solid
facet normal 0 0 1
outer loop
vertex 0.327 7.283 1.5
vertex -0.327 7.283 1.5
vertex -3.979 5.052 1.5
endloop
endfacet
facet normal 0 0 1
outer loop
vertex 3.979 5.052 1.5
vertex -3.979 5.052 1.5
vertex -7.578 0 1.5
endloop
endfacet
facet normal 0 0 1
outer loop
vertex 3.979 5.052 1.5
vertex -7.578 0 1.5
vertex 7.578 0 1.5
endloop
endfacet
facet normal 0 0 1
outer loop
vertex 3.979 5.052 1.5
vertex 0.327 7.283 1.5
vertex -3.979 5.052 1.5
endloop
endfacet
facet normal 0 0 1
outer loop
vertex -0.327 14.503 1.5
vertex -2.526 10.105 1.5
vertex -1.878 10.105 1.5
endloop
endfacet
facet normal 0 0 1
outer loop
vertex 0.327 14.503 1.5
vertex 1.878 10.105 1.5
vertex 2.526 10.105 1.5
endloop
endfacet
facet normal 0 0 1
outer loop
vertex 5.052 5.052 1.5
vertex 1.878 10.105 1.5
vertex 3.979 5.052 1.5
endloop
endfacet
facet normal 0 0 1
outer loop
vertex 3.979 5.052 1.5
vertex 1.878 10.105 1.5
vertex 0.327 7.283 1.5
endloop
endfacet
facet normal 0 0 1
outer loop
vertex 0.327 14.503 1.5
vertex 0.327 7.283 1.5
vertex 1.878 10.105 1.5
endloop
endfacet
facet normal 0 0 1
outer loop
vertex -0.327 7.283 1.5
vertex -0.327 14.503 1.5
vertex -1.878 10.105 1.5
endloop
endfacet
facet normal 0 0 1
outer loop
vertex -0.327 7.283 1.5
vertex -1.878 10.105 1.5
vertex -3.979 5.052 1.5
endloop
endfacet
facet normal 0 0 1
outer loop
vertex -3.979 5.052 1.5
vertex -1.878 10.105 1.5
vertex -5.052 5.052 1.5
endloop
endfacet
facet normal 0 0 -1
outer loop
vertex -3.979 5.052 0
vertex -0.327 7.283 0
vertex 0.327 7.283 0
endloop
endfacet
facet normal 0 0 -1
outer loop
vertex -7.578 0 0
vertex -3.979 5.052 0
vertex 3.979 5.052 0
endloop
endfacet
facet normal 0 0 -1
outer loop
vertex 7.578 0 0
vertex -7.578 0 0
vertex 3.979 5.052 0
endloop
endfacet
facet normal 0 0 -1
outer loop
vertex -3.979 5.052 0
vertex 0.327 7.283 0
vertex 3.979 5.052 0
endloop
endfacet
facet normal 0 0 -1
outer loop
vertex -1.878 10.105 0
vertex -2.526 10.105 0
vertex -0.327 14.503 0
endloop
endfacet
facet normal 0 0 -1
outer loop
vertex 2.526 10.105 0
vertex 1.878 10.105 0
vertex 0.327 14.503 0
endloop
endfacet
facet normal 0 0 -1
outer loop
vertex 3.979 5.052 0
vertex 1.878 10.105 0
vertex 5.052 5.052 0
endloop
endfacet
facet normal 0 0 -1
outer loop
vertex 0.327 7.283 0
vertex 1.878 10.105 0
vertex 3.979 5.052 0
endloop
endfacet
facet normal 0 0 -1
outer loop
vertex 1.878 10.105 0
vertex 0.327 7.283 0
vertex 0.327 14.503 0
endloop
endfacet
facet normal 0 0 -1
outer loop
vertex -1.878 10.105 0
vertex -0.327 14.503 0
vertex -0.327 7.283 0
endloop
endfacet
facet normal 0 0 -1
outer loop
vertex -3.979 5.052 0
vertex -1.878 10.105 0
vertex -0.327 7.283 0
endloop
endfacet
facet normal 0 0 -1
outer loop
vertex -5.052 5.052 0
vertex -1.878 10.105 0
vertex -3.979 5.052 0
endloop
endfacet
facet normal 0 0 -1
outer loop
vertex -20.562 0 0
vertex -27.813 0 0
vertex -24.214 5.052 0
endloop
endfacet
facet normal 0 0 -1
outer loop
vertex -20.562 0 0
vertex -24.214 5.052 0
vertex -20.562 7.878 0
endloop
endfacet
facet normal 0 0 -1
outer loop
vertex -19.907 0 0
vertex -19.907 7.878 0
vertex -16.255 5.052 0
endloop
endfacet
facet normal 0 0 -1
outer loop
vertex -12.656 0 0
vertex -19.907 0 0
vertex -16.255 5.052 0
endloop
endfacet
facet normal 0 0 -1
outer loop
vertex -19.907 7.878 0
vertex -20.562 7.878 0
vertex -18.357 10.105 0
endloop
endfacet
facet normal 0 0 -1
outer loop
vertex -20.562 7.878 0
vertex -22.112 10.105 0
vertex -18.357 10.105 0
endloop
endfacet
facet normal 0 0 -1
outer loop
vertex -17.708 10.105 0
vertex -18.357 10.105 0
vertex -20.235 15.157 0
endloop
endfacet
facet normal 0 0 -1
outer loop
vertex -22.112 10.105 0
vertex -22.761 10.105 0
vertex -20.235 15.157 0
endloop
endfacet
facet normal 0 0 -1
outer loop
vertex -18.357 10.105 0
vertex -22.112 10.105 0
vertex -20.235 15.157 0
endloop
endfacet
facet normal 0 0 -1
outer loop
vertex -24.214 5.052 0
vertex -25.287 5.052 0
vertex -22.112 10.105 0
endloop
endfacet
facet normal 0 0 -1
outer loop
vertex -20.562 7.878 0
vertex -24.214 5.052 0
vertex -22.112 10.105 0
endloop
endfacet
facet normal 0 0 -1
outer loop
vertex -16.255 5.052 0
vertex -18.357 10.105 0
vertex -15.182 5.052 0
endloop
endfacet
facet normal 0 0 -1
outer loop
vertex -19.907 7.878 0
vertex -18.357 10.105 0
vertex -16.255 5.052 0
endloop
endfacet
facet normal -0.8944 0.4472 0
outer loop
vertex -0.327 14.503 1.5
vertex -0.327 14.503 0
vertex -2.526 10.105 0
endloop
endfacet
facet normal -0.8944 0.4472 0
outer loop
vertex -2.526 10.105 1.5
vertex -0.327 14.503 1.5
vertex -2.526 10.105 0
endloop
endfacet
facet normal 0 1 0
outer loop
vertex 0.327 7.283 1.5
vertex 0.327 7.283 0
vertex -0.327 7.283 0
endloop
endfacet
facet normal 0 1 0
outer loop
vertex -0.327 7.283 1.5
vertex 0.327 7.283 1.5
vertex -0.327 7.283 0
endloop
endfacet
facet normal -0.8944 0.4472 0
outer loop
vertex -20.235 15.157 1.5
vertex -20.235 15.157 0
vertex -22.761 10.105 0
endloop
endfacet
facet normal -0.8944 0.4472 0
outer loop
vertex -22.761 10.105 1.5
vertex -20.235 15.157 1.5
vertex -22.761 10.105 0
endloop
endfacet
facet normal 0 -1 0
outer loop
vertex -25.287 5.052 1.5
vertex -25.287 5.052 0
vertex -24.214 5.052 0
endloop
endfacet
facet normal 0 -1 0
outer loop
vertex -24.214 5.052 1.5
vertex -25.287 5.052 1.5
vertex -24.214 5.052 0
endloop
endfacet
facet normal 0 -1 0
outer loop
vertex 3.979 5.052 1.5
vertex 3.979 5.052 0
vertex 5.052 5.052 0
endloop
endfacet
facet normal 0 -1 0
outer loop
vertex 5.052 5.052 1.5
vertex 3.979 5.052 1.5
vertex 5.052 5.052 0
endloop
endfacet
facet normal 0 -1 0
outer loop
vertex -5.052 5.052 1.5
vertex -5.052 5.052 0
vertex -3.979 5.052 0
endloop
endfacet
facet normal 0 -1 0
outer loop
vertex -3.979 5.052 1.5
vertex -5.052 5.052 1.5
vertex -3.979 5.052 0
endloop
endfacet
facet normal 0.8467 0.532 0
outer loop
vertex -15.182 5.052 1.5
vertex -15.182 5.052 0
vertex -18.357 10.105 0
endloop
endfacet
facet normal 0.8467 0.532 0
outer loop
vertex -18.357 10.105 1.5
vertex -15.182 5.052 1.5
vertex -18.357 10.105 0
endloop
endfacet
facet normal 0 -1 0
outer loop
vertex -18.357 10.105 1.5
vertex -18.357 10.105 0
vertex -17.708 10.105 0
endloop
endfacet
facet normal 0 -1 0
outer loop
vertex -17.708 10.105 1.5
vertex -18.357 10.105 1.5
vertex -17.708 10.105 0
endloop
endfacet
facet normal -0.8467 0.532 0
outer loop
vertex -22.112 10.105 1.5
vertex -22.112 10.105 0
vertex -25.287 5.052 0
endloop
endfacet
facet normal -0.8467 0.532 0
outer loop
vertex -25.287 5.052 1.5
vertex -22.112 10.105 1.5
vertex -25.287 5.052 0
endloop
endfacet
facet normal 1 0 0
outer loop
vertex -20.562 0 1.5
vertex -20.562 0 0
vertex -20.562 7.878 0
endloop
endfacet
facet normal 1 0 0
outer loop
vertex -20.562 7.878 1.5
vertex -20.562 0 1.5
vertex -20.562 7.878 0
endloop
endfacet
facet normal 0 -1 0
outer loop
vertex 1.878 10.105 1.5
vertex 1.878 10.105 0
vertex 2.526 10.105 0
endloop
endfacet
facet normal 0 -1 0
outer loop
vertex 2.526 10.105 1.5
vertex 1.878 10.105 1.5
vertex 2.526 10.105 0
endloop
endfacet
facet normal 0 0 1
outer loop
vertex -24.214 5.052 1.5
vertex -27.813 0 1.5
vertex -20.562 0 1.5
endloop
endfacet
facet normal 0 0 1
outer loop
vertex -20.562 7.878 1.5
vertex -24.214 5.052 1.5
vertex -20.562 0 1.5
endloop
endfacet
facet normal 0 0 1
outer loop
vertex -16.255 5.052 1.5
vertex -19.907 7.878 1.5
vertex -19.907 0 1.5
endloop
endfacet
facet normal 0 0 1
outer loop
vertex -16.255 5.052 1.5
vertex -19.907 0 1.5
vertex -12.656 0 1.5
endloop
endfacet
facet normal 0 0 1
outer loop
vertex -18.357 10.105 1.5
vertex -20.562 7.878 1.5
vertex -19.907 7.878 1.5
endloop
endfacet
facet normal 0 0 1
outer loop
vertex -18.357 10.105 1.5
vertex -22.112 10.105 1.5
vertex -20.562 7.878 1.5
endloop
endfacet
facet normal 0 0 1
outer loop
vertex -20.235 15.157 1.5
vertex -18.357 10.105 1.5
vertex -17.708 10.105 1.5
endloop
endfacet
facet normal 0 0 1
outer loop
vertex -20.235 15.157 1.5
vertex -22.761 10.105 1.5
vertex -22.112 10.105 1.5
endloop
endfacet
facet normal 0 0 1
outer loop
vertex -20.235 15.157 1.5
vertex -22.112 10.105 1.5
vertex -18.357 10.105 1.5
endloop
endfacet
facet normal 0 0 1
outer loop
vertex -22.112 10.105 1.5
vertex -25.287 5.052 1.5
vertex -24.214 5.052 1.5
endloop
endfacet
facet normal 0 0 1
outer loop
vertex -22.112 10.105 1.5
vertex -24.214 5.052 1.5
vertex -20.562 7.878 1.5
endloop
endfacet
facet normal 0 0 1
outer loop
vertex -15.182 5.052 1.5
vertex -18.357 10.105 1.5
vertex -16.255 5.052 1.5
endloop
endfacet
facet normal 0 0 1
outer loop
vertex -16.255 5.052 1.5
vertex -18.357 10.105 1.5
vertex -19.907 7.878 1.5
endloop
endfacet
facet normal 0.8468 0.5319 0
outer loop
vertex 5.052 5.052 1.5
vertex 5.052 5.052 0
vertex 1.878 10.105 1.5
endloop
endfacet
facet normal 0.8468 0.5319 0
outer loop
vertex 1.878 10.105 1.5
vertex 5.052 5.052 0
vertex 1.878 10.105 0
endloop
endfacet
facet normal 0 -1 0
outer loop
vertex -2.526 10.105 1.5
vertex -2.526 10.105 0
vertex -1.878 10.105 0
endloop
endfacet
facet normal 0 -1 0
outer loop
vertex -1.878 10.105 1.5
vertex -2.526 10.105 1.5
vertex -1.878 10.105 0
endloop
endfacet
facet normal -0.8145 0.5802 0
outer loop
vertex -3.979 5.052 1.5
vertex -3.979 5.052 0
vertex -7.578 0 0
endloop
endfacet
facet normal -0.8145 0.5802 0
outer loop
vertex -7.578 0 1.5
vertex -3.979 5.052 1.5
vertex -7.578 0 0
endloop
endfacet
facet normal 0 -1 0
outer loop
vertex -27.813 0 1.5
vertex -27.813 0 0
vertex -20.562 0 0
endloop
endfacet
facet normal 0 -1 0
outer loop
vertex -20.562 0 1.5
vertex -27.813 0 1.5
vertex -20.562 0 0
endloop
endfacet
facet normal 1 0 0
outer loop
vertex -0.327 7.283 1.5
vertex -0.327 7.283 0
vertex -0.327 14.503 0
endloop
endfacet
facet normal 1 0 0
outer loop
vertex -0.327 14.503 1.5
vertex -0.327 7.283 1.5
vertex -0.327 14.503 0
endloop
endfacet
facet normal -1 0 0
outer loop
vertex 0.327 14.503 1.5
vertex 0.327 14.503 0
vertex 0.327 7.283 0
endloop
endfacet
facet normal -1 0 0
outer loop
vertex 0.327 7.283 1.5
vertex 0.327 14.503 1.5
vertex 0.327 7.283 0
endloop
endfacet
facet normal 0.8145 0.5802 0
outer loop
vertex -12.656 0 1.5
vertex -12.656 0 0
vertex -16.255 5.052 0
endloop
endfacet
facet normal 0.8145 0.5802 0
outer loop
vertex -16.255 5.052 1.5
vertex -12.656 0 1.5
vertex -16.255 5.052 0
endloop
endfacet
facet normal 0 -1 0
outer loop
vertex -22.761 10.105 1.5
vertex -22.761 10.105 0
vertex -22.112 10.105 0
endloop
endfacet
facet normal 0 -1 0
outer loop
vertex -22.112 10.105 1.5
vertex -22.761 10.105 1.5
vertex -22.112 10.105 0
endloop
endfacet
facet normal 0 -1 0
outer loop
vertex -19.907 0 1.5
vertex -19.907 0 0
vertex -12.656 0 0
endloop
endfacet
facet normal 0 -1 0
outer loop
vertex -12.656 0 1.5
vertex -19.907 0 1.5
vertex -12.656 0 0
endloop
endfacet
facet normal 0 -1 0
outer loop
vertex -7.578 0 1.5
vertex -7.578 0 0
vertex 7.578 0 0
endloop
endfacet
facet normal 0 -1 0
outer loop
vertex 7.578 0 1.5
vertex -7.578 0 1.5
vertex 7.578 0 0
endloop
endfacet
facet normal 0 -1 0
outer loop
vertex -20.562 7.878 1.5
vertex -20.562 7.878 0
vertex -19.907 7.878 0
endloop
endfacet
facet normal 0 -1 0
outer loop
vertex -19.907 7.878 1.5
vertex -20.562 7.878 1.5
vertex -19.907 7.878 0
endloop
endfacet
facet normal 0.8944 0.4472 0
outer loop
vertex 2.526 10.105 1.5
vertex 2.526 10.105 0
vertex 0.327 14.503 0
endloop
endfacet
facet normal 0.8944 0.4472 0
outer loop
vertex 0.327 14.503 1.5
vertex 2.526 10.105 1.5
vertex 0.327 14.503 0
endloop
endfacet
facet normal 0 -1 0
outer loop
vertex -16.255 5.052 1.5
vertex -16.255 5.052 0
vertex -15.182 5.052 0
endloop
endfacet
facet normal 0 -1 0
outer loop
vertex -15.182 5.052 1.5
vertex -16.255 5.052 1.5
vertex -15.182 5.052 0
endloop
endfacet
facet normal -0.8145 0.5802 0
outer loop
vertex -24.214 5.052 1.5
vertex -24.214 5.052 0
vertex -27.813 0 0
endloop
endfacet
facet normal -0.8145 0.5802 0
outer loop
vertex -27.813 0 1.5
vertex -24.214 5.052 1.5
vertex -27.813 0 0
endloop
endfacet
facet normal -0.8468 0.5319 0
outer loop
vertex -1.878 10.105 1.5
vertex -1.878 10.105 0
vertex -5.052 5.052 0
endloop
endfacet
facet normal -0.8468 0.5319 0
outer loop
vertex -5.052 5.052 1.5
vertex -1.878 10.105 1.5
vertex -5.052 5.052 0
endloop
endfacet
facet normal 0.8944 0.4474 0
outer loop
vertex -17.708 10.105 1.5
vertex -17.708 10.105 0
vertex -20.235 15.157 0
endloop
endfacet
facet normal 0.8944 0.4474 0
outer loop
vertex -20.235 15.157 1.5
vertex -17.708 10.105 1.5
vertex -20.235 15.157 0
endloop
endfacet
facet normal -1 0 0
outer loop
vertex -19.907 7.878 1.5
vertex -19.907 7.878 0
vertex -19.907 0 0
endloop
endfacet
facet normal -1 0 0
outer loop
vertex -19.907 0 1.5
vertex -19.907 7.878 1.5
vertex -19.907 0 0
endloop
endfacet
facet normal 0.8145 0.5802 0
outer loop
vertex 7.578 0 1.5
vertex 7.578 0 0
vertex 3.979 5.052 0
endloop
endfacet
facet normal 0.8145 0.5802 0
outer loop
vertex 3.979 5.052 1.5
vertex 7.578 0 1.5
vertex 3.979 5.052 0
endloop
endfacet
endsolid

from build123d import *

# Parameters (mm, degrees)
F1_DEPTH = 1.5


with BuildPart() as f1:
    # F0 (on Top) → F1 (new body)
    with BuildSketch(Plane.XY):
        Polygon((-18.356969, 10.104657), (-17.708446, 10.104657), (-20.23461, 15.156986), (-22.760774, 10.104657), (-22.112251, 10.104657), (-25.286939, 5.052329), (-24.213863, 5.052329), (-27.813103, 0), (-20.561783, 0), (-20.561783, 0.654345), (-20.561783, 7.578493), (-20.561783, 7.878493), (-19.907437, 7.878493), (-19.907437, 7.578493), (-19.907437, 0.654345), (-19.907437, 0), (-12.656117, 0), (-16.255357, 5.052329), (-15.182281, 5.052329), align=None)
        Polygon((0, 0), (7.578493, 0), (3.979253, 5.052329), (5.052329, 5.052329), (1.877641, 10.104657), (2.526164, 10.104657), (0.327173, 14.502641), (0.327173, 7.578493), (0.327173, 7.282674), (-0.327173, 7.282674), (-0.327173, 7.578493), (-0.327173, 14.502641), (-2.526164, 10.104657), (-1.877641, 10.104657), (-5.052329, 5.052329), (-3.979253, 5.052329), (-7.578493, 0), align=None)
    extrude(amount=F1_DEPTH)


solid = f1.part
